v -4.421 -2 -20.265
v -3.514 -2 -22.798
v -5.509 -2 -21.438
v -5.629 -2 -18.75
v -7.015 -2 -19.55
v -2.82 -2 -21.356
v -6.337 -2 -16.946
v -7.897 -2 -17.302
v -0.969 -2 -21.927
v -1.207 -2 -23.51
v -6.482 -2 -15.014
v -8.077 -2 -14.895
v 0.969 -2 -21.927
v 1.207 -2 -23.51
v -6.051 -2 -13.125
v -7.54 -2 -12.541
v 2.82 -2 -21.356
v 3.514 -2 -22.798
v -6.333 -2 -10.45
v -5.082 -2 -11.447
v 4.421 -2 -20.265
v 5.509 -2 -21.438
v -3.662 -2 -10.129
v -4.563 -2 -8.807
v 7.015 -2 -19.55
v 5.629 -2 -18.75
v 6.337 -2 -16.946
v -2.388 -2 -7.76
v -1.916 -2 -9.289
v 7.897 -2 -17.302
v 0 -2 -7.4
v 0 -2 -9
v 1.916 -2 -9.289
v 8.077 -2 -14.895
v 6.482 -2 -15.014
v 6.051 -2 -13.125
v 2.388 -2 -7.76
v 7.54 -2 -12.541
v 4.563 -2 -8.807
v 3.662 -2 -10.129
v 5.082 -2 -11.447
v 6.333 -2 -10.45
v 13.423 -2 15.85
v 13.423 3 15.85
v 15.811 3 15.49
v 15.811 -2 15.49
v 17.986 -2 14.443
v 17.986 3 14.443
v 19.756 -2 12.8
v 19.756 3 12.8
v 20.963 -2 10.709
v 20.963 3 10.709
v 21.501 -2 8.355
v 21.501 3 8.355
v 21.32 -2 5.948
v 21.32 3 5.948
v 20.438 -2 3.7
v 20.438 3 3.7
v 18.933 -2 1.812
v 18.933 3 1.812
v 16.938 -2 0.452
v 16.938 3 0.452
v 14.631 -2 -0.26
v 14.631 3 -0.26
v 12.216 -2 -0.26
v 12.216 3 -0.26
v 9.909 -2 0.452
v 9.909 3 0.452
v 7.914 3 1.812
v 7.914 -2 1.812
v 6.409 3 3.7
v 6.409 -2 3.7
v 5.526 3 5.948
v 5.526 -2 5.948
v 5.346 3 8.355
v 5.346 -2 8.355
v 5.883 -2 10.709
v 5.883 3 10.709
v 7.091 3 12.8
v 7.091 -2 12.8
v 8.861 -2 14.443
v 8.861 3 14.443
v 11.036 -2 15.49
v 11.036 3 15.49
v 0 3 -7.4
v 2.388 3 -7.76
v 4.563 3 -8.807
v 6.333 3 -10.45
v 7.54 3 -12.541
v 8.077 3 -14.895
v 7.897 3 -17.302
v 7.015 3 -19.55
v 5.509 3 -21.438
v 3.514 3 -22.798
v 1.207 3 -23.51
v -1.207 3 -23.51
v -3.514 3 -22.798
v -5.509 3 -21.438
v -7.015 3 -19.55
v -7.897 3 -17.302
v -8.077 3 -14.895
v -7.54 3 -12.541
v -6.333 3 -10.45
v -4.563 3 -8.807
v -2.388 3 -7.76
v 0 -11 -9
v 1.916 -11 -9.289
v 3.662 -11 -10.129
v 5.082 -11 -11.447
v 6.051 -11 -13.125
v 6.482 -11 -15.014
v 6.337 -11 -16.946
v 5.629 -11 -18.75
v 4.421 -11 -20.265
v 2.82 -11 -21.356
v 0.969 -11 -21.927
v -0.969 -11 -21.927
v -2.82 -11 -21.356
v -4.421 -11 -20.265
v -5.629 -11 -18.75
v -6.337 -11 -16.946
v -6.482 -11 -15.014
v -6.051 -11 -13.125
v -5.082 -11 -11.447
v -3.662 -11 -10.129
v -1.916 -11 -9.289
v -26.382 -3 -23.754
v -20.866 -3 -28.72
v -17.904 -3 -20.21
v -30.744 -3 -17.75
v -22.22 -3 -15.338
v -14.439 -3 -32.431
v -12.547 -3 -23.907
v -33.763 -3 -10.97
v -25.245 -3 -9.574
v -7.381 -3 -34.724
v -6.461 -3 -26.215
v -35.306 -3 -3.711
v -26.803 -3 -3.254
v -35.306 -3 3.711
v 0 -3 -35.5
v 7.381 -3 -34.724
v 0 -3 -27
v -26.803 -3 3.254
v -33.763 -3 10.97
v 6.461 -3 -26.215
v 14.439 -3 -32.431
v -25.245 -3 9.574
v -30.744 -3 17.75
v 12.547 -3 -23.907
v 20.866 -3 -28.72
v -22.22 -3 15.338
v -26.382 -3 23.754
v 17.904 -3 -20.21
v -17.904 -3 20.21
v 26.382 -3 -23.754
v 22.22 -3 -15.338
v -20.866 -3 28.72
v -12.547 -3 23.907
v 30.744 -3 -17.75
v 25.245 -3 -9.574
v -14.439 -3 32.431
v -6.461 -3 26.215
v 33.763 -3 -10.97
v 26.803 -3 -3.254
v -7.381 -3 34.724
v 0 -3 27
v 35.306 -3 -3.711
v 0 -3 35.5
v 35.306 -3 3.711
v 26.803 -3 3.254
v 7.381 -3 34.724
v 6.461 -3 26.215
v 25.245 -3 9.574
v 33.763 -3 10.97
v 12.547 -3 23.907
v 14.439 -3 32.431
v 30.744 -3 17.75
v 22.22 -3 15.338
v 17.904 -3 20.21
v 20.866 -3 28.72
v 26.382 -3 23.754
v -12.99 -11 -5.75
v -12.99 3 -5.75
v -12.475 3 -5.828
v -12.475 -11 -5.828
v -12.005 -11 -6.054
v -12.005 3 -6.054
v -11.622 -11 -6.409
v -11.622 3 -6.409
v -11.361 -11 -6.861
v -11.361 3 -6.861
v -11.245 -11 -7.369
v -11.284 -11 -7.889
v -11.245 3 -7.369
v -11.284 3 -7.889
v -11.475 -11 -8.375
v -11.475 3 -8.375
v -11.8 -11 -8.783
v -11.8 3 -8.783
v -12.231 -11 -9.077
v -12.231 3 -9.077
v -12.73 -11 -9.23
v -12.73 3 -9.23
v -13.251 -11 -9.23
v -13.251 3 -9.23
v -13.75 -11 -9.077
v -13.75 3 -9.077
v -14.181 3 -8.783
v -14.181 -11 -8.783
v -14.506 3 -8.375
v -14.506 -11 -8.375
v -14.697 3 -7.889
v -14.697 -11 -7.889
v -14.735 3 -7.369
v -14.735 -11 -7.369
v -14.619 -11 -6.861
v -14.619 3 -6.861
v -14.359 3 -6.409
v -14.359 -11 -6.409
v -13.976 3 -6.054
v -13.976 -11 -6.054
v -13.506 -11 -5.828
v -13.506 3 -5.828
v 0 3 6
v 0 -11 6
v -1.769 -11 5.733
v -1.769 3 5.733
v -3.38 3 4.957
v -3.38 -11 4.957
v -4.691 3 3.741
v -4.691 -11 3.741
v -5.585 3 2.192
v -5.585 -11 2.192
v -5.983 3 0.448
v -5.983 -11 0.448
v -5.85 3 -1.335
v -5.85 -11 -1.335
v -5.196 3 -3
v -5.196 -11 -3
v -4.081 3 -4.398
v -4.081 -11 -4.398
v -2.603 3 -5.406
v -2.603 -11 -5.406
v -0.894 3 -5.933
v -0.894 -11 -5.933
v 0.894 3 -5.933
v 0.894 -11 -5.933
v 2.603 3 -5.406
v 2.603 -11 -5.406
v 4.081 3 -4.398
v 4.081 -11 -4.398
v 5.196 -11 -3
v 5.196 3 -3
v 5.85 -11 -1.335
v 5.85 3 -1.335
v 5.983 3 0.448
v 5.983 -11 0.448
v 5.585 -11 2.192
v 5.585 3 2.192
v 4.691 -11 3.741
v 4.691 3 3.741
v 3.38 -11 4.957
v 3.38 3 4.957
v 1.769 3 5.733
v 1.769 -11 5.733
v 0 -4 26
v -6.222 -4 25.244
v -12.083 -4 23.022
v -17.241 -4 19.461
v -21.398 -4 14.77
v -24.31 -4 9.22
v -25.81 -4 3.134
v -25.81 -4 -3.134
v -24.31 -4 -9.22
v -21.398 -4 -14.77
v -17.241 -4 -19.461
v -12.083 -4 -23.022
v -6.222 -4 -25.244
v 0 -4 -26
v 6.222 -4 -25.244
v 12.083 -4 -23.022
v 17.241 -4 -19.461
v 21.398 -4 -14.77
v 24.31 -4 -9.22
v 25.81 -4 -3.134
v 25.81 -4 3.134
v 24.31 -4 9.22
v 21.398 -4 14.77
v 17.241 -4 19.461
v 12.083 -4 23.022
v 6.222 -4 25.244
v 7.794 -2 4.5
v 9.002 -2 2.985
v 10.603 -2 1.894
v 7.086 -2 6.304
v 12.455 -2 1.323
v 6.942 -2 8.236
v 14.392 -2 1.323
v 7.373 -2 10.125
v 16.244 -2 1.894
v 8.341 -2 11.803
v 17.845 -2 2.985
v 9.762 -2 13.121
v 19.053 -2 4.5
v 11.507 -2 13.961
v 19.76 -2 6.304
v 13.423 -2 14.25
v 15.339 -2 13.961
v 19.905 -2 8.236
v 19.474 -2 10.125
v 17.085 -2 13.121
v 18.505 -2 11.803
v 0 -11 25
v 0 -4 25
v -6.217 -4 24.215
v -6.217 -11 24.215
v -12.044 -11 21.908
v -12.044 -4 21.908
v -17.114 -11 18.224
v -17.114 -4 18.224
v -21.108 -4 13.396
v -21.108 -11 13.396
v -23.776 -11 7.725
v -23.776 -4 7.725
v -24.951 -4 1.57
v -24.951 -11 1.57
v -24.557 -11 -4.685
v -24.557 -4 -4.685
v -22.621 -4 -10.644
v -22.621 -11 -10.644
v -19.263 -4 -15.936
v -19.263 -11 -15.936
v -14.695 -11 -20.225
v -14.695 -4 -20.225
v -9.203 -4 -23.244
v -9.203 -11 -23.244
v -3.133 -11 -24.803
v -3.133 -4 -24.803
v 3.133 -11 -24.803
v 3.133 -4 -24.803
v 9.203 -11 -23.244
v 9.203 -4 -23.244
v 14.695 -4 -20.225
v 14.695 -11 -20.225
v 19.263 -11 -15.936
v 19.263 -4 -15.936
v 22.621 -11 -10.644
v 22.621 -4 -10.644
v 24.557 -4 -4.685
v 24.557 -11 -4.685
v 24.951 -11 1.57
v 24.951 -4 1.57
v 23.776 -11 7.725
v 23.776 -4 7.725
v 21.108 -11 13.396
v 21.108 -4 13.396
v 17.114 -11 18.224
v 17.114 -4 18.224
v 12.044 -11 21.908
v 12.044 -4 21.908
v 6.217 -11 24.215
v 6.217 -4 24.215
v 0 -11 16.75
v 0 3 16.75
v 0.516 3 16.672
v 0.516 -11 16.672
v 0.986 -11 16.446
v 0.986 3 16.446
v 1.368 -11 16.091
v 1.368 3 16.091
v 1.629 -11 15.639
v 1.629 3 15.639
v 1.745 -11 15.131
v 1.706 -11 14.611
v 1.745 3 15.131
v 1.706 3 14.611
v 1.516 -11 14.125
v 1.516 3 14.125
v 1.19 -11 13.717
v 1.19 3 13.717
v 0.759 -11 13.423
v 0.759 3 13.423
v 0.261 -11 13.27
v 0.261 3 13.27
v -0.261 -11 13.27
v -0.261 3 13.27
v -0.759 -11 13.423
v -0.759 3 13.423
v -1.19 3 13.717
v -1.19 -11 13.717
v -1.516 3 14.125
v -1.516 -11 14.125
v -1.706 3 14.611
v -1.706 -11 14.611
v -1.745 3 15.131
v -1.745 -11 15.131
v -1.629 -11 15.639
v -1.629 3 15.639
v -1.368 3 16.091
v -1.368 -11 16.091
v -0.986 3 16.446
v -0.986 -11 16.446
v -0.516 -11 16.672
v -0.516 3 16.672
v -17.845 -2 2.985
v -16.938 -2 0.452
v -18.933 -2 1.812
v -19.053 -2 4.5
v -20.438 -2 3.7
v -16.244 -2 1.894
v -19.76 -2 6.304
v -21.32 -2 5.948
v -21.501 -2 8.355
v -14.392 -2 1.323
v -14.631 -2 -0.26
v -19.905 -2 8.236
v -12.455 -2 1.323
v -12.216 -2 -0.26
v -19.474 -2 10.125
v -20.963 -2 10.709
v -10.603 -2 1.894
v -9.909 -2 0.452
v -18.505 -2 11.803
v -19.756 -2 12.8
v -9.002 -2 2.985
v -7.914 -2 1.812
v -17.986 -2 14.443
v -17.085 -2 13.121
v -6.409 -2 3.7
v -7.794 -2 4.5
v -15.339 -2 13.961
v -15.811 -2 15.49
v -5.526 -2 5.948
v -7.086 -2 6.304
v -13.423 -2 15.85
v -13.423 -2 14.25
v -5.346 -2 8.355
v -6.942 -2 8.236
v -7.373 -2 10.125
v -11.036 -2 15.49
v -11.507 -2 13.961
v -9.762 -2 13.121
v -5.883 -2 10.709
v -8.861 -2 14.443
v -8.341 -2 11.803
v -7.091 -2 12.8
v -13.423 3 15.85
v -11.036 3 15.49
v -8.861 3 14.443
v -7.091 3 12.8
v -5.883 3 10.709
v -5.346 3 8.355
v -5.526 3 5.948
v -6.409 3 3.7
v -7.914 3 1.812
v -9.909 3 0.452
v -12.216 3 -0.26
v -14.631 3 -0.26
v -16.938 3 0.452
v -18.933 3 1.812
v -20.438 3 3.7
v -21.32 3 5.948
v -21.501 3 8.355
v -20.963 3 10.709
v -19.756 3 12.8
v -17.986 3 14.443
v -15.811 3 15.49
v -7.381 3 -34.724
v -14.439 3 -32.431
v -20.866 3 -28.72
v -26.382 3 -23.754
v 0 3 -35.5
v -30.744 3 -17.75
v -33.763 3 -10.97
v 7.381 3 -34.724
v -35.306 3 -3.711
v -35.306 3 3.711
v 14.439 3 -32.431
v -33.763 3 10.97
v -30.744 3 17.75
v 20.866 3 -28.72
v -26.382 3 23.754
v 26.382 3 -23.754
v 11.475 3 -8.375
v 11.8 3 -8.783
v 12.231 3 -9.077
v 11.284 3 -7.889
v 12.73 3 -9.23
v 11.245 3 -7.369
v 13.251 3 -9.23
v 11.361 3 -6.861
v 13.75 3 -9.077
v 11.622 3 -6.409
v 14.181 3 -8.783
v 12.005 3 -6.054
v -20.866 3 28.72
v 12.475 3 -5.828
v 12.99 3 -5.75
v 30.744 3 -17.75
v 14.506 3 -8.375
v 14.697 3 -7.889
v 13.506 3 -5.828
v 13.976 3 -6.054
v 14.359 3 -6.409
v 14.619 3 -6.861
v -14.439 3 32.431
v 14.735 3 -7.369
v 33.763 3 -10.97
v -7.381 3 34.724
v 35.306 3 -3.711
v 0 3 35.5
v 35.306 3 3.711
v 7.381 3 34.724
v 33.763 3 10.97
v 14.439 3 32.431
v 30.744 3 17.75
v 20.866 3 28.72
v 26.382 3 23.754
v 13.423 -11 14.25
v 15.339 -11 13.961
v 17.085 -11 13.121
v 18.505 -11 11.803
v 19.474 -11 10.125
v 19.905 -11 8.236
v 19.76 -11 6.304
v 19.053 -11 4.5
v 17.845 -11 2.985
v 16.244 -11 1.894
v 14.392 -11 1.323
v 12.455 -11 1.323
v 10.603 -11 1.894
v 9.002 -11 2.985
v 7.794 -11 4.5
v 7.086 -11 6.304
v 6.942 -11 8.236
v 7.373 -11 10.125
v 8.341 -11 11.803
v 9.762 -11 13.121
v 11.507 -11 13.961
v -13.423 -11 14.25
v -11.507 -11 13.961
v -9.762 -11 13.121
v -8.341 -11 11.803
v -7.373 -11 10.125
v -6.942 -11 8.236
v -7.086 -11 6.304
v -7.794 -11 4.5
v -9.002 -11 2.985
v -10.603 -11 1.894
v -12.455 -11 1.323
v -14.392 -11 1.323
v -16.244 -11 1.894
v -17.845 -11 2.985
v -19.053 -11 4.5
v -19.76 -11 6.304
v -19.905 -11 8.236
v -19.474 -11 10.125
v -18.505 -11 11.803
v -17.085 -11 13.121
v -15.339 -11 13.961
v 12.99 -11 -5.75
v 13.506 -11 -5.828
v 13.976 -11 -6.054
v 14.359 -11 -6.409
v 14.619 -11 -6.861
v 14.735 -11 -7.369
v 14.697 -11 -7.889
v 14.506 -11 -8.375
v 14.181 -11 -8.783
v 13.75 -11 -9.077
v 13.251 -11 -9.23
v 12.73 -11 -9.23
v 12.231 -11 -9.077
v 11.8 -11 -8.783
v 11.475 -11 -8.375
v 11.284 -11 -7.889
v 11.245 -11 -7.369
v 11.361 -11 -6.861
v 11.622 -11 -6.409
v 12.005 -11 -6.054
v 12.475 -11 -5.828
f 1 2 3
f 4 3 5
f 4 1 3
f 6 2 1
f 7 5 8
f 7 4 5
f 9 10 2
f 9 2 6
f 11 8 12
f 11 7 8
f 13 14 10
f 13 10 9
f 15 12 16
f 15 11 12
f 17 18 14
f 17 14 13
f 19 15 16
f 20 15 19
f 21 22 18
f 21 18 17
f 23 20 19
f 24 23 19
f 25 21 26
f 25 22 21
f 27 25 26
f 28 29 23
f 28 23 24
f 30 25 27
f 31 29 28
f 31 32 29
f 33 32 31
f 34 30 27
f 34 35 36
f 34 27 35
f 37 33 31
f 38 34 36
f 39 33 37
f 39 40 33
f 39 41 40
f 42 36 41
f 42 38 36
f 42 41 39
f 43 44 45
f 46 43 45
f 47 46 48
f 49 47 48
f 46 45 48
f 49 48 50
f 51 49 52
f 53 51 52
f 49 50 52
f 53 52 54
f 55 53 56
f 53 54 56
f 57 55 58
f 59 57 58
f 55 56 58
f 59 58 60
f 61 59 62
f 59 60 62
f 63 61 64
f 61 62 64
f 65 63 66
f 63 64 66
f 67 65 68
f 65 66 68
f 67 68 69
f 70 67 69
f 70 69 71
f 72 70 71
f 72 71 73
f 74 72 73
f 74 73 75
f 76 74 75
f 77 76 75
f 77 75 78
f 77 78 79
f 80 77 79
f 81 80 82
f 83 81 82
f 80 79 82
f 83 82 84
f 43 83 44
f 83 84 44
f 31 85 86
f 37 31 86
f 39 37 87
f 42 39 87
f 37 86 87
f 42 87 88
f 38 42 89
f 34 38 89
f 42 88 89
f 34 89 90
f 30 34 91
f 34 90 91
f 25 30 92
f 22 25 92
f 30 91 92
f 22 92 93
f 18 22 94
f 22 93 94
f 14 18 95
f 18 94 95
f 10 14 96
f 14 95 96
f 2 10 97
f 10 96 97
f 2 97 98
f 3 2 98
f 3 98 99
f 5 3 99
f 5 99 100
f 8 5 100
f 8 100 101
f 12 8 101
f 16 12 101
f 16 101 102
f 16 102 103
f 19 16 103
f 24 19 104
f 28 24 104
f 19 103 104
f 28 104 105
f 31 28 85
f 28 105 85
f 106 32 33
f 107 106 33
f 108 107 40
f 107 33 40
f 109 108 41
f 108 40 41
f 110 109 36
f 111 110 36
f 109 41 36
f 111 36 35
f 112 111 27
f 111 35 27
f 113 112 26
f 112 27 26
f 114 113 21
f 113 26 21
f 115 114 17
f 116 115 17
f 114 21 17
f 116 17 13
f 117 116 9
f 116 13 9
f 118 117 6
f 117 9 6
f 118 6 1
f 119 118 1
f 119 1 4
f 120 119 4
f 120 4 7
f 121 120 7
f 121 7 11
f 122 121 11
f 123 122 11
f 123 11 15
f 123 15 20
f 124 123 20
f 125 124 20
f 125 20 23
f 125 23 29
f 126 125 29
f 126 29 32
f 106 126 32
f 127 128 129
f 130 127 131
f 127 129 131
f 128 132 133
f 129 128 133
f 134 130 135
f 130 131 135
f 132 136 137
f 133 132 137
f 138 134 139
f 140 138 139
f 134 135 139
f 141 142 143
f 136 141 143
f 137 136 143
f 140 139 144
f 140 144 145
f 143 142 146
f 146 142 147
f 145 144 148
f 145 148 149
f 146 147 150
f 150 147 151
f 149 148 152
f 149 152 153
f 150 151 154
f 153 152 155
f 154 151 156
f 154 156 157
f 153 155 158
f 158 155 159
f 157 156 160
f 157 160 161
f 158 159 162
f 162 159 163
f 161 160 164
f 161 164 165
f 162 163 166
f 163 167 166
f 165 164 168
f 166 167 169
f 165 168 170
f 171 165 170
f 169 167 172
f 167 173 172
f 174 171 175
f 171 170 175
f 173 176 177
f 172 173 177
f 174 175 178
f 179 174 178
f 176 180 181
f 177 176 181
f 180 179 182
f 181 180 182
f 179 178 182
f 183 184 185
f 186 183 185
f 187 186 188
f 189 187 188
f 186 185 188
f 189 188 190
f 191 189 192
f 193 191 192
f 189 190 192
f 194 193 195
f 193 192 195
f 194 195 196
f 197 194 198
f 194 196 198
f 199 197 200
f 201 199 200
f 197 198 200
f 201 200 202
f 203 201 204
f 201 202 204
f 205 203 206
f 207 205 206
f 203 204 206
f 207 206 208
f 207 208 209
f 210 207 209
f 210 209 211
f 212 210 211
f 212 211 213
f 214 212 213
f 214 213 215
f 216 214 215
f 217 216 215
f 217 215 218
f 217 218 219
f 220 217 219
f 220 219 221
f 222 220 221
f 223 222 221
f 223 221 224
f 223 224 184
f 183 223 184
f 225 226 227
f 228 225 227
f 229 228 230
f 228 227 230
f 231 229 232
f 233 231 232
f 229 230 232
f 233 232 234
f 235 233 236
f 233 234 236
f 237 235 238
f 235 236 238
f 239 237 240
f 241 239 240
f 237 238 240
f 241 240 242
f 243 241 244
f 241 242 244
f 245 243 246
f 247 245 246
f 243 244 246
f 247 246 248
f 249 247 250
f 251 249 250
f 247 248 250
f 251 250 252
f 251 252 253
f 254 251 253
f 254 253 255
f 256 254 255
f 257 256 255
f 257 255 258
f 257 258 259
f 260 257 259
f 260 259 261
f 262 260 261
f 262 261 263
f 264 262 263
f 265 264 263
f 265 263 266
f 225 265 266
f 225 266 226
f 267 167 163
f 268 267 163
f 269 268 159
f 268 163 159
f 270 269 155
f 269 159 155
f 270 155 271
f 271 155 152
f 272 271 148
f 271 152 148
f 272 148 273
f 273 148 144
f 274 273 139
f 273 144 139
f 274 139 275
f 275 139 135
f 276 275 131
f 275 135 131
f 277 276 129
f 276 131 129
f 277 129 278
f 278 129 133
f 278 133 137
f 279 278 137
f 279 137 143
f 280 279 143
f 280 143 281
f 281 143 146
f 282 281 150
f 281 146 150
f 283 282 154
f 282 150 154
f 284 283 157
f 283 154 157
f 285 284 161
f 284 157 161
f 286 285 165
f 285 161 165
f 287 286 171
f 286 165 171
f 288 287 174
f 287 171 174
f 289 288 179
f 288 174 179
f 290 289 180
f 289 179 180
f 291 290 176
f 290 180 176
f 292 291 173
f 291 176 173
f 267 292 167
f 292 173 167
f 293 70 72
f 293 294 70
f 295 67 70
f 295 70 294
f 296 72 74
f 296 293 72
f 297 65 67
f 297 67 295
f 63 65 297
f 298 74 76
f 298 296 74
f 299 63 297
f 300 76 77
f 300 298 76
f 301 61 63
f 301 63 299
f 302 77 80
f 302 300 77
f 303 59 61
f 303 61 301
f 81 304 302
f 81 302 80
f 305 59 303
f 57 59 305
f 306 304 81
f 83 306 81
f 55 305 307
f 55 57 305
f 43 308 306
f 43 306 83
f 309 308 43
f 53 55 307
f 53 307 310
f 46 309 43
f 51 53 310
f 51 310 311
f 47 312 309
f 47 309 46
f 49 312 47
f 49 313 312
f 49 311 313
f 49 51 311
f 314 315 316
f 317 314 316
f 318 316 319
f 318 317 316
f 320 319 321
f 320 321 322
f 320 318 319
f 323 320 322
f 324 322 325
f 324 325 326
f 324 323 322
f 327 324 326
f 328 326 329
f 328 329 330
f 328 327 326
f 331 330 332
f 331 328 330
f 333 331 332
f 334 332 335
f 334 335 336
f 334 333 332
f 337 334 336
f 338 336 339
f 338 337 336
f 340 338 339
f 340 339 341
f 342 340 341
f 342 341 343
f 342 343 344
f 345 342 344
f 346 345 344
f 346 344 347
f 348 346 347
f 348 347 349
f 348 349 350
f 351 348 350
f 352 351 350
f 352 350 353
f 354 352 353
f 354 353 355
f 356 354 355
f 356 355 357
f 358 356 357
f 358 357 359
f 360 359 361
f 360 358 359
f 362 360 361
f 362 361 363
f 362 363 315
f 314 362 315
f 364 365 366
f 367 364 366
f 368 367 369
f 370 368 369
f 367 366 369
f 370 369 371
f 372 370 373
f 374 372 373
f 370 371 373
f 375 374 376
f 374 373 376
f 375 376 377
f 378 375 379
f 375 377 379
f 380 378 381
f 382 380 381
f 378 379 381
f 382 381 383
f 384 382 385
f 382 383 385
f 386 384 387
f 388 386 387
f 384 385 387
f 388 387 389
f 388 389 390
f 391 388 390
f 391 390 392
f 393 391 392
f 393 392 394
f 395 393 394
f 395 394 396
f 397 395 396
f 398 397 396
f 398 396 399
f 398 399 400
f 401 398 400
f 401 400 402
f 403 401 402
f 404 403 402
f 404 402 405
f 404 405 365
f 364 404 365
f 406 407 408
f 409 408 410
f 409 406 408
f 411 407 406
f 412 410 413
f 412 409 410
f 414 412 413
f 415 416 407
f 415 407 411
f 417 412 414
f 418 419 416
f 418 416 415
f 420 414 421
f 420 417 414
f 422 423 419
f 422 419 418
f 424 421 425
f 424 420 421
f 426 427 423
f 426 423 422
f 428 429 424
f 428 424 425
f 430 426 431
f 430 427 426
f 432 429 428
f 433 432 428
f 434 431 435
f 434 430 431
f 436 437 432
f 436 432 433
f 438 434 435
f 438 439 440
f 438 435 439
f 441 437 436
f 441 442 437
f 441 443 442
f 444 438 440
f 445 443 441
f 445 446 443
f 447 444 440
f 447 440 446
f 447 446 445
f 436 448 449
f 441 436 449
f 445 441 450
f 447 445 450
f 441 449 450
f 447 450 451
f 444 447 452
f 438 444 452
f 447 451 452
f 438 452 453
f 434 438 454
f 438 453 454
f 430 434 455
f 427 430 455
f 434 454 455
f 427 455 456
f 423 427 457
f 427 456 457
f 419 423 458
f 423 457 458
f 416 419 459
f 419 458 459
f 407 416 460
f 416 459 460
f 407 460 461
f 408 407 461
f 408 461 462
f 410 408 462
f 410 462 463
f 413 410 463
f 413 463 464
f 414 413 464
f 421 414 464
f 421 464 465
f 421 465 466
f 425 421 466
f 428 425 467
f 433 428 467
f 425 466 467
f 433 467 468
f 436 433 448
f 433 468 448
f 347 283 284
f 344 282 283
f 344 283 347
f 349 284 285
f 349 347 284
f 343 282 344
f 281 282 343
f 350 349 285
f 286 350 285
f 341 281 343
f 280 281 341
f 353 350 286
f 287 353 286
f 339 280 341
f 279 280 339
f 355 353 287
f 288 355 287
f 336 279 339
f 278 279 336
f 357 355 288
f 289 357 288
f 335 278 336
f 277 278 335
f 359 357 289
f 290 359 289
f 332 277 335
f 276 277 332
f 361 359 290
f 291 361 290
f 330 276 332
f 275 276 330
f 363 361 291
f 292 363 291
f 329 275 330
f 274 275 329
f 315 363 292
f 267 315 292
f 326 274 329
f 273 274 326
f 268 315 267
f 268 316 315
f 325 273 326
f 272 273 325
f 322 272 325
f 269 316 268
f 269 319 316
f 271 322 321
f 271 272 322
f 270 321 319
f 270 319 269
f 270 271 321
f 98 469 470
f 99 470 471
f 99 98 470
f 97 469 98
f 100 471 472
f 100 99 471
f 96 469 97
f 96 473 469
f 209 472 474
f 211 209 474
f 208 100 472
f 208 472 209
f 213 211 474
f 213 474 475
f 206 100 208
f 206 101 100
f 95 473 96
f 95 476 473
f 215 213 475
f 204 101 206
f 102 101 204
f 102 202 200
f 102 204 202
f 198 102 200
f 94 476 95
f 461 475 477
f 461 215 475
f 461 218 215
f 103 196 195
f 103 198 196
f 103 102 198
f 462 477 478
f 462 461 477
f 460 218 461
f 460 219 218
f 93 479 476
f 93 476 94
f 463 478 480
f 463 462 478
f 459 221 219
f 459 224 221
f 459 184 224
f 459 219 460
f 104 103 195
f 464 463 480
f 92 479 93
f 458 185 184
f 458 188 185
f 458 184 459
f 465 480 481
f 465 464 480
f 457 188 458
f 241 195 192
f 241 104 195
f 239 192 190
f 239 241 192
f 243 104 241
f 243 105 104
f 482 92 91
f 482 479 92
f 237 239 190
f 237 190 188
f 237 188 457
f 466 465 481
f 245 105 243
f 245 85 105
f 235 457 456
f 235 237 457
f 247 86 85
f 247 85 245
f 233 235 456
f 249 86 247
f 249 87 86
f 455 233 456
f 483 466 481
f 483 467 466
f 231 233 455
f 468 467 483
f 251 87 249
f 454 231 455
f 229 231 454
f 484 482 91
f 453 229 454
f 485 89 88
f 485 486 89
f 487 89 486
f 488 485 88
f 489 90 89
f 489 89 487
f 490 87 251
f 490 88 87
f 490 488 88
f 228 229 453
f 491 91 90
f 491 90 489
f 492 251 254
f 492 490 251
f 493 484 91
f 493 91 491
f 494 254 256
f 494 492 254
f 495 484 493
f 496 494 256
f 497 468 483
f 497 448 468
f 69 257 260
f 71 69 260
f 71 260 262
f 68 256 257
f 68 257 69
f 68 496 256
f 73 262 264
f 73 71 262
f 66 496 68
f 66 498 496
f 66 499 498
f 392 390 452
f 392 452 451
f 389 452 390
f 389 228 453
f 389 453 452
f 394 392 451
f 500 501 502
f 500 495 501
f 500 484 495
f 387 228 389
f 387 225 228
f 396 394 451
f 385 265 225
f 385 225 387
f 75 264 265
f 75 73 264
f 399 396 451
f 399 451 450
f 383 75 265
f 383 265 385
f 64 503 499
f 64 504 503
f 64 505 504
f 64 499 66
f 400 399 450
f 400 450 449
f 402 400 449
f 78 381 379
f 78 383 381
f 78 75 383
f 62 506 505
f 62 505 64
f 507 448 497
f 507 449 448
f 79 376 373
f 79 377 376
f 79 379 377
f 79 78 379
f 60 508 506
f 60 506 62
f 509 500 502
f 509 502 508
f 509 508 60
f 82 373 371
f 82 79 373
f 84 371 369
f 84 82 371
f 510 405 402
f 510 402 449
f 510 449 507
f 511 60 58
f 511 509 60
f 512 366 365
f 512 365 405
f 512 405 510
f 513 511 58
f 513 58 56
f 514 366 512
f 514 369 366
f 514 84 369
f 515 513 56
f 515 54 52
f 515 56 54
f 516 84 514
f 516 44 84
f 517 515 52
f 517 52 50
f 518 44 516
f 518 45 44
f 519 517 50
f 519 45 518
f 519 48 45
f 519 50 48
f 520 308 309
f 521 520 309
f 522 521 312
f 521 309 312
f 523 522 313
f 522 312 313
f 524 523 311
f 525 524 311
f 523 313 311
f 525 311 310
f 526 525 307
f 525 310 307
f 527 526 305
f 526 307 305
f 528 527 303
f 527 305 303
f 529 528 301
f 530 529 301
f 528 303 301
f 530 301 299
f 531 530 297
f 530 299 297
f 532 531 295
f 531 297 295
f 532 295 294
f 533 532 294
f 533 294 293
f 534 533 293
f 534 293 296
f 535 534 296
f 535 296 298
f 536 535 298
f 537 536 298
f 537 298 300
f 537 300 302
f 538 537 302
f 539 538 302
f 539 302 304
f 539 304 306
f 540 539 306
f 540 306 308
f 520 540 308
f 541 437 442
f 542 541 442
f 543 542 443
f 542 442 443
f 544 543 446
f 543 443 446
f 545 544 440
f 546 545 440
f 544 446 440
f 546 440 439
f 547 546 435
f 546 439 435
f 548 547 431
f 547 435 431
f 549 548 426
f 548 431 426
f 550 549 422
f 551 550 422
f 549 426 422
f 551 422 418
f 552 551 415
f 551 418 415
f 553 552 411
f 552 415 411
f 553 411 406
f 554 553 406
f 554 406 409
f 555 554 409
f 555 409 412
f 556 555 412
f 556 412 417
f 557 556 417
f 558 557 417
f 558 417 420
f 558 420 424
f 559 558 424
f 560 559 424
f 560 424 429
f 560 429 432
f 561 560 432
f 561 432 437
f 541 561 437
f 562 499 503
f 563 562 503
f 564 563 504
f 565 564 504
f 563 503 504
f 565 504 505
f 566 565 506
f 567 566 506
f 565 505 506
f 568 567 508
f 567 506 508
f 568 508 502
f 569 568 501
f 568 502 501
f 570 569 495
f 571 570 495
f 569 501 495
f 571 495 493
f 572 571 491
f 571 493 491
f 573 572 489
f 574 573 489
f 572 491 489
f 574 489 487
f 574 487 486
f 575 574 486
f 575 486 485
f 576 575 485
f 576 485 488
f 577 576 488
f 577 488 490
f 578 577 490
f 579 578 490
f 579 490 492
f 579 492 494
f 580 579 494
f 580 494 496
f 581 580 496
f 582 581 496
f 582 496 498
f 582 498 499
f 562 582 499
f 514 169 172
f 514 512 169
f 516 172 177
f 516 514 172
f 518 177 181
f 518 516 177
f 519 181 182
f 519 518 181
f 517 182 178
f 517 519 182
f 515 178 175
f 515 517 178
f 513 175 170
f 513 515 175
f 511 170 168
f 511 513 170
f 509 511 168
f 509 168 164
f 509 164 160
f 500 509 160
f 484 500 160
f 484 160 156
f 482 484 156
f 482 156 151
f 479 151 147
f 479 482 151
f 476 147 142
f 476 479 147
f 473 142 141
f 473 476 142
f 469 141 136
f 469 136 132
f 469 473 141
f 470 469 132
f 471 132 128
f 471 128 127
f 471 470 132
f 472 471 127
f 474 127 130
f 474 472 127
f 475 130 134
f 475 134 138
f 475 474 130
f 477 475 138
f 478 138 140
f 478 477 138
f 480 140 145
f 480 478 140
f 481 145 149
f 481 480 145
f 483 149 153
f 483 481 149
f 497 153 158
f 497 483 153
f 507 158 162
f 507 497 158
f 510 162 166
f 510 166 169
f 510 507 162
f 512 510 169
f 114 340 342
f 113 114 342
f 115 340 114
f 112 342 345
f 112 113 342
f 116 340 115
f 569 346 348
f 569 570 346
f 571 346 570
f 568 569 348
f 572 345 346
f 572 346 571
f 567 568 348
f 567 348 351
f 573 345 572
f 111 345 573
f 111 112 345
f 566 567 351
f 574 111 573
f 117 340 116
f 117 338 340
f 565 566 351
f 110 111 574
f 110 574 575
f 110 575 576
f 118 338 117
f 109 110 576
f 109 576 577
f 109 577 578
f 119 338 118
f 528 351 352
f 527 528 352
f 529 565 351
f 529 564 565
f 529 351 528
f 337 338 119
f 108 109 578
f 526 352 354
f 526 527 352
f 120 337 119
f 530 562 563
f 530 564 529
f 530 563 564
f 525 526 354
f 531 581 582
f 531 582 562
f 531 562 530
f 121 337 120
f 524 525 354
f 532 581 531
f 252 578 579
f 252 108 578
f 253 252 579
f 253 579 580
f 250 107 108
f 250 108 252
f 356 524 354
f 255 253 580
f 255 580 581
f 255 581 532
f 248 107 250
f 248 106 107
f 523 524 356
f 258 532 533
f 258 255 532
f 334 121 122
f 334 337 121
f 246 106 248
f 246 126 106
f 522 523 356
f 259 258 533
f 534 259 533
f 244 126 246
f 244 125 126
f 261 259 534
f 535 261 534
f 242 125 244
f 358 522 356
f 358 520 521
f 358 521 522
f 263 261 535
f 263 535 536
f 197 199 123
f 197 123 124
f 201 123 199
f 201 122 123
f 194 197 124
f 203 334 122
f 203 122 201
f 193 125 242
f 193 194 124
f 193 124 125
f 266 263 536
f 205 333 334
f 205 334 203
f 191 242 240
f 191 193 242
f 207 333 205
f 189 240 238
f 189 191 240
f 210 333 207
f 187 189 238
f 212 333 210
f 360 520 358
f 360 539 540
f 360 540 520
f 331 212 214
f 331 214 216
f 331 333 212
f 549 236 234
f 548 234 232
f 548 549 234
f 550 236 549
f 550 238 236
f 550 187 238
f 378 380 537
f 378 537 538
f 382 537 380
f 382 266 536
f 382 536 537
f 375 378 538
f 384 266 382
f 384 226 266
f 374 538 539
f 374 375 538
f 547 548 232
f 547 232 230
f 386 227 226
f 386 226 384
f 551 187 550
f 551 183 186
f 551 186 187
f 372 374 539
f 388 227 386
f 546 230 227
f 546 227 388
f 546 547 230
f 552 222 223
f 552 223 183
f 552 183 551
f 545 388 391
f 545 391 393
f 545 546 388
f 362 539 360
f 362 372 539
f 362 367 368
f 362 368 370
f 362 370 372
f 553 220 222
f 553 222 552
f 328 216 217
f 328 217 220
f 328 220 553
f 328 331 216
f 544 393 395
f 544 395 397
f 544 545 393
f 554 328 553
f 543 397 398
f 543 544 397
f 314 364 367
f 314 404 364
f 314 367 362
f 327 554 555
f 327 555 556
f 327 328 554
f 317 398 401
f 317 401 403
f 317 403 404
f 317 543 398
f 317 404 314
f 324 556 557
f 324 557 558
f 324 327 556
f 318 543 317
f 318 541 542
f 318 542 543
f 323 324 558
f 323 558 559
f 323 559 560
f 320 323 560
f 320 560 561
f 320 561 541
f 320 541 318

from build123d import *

# Parameters (mm, degrees)
SKETCH1_R               = 35.5
BOSS_EXTRUDE1_DEPTH     = 3
SKETCH2_R               = 26
BOSS_EXTRUDE2_DEPTH     = 1
SKETCH3_R               = 25
BOSS_EXTRUDE3_DEPTH     = 19
SKETCH5_R               = 6
CUT_EXTRUDE2_DEPTH      = 57.53759811
SKETCH6_R               = 30.018937713
SKETCH6_R_2             = 20
CUT_EXTRUDE3_DEPTH      = 12
CHAMFER2_SIZE           = 2.5
BOSS_EXTRUDE4_START     = 8
SKETCH8_R               = 25
BOSS_EXTRUDE4_DEPTH     = 8
SKETCH10_R              = 6
CUT_EXTRUDE6_DEPTH      = 61.634148794
SKETCH7_R               = 1.75
CUT_EXTRUDE4_DEPTH      = 61.634148794
BOSS_EXTRUDE5_START     = 1
SKETCH11_R              = 26
SKETCH11_R_2            = 25
BOSS_EXTRUDE5_DEPTH     = 1
CHAMFER1_SIZE           = 1
CUT_EXTRUDE7_DEPTH      = 56.222278113
CUT_EXTRUDE7_DEPTH_BACK = 56.222278113
SKETCH12_W              = 92.25680519
SKETCH12_H              = 27.524612869
SKETCH14_R              = 8.1
CUT_EXTRUDE8_DEPTH      = 5
SKETCH15_R              = 6.5
CUT_EXTRUDE9_DEPTH      = 52.004901725


with BuildPart() as part:
    # Sketch1 → Boss-Extrude1 (new, symmetric)
    with BuildSketch(Plane(origin=(0, 0, 0), x_dir=(1, 0, 0), z_dir=(0, 1, 0))):
        with Locations(Location((0, 0, 0), (0, 0, 270))):
            Circle(SKETCH1_R)
    extrude(amount=BOSS_EXTRUDE1_DEPTH, both=True)

    # Sketch2 → Boss-Extrude2 (add)
    with BuildSketch(Plane(origin=(0, 3, 0), x_dir=(1, 0, 0), z_dir=(0, 1, 0))):
        with Locations(Location((0, 0, 0), (0, 0, 270))):
            Circle(SKETCH2_R)
    extrude(amount=BOSS_EXTRUDE2_DEPTH)

    # Sketch3 → Boss-Extrude3 (add)
    with BuildSketch(Plane(origin=(0, 4, 0), x_dir=(1, 0, 0), z_dir=(0, 1, 0))):
        with Locations(Location((0, 0, 0), (0, 0, 270))):
            Circle(SKETCH3_R)
    extrude(amount=BOSS_EXTRUDE3_DEPTH)

    # Sketch5 → Cut-Extrude2 (cut, through all)
    with BuildSketch(Plane(origin=(0, 23, 0), x_dir=(1, 0, 0), z_dir=(0, 1, 0))):
        with Locations(Location((0, 0, 0), (0, 0, 270))):
            Circle(SKETCH5_R)
    extrude(amount=-CUT_EXTRUDE2_DEPTH, mode=Mode.SUBTRACT)

    # Sketch6 → Cut-Extrude3 (cut)
    with BuildSketch(Plane(origin=(0, 23, 0), x_dir=(1, 0, 0), z_dir=(0, 1, 0))):
        Circle(SKETCH6_R)
        with Locations(Location((0, 0, 0), (0, 0, 270))):
            Circle(SKETCH6_R_2, mode=Mode.SUBTRACT)
    extrude(amount=-CUT_EXTRUDE3_DEPTH, mode=Mode.SUBTRACT)

    # Chamfer2
    chamfer2_edges = [part.edges().sort_by_distance(p)[0] for p in [
        (0, 11, -20),
    ]]
    chamfer(chamfer2_edges, length=CHAMFER2_SIZE)

    # Sketch8 → Boss-Extrude4 (add)
    with BuildSketch(Plane.XZ.offset(3).offset(BOSS_EXTRUDE4_START)):
        with Locations(Location((0, 0, 0), (0, 0, 90))):
            Circle(SKETCH8_R)
    extrude(amount=-BOSS_EXTRUDE4_DEPTH)

    # Sketch10 → Cut-Extrude6 (cut, through all)
    with BuildSketch(Plane.XZ.offset(11)):
        with Locations(Location((0, 0, 0), (0, 0, 90))):
            Circle(SKETCH10_R)
    extrude(amount=-CUT_EXTRUDE6_DEPTH, mode=Mode.SUBTRACT)

    # Sketch7 → Cut-Extrude4 (cut, through all)
    with BuildSketch(Plane(origin=(0, 23, 0), x_dir=(1, 0, 0), z_dir=(0, 1, 0))):
        with Locations(Location((0, -15, 0), (0, 0, 270))):
            Circle(SKETCH7_R)
        with Locations(Location((-12.990381057, 7.5, 0), (0, 0, 270))):
            Circle(SKETCH7_R)
        with Locations(Location((12.990381057, 7.5, 0), (0, 0, 270))):
            Circle(SKETCH7_R)
    extrude(amount=-CUT_EXTRUDE4_DEPTH, mode=Mode.SUBTRACT)

    # Sketch11 → Boss-Extrude5 (add)
    with BuildSketch(Plane.XZ.offset(3).offset(BOSS_EXTRUDE5_START)):
        with Locations(Location((0, 0, 0), (0, 0, 90))):
            Circle(SKETCH11_R)
        with Locations(Location((0, 0, 0), (0, 0, 90))):
            Circle(SKETCH11_R_2, mode=Mode.SUBTRACT)
    extrude(amount=-BOSS_EXTRUDE5_DEPTH)

    # Chamfer1
    chamfer1_edges = [part.edges().sort_by_distance(p)[0] for p in [
        (0, 3, -26),
        (0, -3, -26),
    ]]
    chamfer(chamfer1_edges, length=CHAMFER1_SIZE - 0.0001)  # a hair under: the kernel refuses the full size

    # Sketch12 → Cut-Extrude7 (cut, two sides: drawn at the far end of the back side and taken through both)
    with BuildSketch(Plane.XY.offset(-CUT_EXTRUDE7_DEPTH_BACK)):
        with Locations((2.130775151, 16.762306435)):
            Rectangle(SKETCH12_W, SKETCH12_H)
    extrude(amount=CUT_EXTRUDE7_DEPTH + CUT_EXTRUDE7_DEPTH_BACK, mode=Mode.SUBTRACT)

    # Sketch14 → Cut-Extrude8 (cut)
    with BuildSketch(Plane(origin=(0, 3, 0), x_dir=(1, 0, 0), z_dir=(0, 1, 0))):
        with Locations(Location((0, 15.5, 0), (0, 0, 270))):
            Circle(SKETCH14_R)
        with Locations(Location((13.423393759, -7.75, 0), (0, 0, 270))):
            Circle(SKETCH14_R)
        with Locations(Location((-13.423393759, -7.75, 0), (0, 0, 270))):
            Circle(SKETCH14_R)
    extrude(amount=-CUT_EXTRUDE8_DEPTH, mode=Mode.SUBTRACT)

    # Sketch15 → Cut-Extrude9 (cut, through all)
    with BuildSketch(Plane(origin=(0, -2, 0), x_dir=(1, 0, 0), z_dir=(0, 1, 0))):
        with Locations(Location((0, 15.5, 0), (0, 0, 270))):
            Circle(SKETCH15_R)
        with Locations(Location((13.423393759, -7.75, 0), (0, 0, 270))):
            Circle(SKETCH15_R)
        with Locations(Location((-13.423393759, -7.75, 0), (0, 0, 270))):
            Circle(SKETCH15_R)
    extrude(amount=-CUT_EXTRUDE9_DEPTH, mode=Mode.SUBTRACT)


solid = part.part
